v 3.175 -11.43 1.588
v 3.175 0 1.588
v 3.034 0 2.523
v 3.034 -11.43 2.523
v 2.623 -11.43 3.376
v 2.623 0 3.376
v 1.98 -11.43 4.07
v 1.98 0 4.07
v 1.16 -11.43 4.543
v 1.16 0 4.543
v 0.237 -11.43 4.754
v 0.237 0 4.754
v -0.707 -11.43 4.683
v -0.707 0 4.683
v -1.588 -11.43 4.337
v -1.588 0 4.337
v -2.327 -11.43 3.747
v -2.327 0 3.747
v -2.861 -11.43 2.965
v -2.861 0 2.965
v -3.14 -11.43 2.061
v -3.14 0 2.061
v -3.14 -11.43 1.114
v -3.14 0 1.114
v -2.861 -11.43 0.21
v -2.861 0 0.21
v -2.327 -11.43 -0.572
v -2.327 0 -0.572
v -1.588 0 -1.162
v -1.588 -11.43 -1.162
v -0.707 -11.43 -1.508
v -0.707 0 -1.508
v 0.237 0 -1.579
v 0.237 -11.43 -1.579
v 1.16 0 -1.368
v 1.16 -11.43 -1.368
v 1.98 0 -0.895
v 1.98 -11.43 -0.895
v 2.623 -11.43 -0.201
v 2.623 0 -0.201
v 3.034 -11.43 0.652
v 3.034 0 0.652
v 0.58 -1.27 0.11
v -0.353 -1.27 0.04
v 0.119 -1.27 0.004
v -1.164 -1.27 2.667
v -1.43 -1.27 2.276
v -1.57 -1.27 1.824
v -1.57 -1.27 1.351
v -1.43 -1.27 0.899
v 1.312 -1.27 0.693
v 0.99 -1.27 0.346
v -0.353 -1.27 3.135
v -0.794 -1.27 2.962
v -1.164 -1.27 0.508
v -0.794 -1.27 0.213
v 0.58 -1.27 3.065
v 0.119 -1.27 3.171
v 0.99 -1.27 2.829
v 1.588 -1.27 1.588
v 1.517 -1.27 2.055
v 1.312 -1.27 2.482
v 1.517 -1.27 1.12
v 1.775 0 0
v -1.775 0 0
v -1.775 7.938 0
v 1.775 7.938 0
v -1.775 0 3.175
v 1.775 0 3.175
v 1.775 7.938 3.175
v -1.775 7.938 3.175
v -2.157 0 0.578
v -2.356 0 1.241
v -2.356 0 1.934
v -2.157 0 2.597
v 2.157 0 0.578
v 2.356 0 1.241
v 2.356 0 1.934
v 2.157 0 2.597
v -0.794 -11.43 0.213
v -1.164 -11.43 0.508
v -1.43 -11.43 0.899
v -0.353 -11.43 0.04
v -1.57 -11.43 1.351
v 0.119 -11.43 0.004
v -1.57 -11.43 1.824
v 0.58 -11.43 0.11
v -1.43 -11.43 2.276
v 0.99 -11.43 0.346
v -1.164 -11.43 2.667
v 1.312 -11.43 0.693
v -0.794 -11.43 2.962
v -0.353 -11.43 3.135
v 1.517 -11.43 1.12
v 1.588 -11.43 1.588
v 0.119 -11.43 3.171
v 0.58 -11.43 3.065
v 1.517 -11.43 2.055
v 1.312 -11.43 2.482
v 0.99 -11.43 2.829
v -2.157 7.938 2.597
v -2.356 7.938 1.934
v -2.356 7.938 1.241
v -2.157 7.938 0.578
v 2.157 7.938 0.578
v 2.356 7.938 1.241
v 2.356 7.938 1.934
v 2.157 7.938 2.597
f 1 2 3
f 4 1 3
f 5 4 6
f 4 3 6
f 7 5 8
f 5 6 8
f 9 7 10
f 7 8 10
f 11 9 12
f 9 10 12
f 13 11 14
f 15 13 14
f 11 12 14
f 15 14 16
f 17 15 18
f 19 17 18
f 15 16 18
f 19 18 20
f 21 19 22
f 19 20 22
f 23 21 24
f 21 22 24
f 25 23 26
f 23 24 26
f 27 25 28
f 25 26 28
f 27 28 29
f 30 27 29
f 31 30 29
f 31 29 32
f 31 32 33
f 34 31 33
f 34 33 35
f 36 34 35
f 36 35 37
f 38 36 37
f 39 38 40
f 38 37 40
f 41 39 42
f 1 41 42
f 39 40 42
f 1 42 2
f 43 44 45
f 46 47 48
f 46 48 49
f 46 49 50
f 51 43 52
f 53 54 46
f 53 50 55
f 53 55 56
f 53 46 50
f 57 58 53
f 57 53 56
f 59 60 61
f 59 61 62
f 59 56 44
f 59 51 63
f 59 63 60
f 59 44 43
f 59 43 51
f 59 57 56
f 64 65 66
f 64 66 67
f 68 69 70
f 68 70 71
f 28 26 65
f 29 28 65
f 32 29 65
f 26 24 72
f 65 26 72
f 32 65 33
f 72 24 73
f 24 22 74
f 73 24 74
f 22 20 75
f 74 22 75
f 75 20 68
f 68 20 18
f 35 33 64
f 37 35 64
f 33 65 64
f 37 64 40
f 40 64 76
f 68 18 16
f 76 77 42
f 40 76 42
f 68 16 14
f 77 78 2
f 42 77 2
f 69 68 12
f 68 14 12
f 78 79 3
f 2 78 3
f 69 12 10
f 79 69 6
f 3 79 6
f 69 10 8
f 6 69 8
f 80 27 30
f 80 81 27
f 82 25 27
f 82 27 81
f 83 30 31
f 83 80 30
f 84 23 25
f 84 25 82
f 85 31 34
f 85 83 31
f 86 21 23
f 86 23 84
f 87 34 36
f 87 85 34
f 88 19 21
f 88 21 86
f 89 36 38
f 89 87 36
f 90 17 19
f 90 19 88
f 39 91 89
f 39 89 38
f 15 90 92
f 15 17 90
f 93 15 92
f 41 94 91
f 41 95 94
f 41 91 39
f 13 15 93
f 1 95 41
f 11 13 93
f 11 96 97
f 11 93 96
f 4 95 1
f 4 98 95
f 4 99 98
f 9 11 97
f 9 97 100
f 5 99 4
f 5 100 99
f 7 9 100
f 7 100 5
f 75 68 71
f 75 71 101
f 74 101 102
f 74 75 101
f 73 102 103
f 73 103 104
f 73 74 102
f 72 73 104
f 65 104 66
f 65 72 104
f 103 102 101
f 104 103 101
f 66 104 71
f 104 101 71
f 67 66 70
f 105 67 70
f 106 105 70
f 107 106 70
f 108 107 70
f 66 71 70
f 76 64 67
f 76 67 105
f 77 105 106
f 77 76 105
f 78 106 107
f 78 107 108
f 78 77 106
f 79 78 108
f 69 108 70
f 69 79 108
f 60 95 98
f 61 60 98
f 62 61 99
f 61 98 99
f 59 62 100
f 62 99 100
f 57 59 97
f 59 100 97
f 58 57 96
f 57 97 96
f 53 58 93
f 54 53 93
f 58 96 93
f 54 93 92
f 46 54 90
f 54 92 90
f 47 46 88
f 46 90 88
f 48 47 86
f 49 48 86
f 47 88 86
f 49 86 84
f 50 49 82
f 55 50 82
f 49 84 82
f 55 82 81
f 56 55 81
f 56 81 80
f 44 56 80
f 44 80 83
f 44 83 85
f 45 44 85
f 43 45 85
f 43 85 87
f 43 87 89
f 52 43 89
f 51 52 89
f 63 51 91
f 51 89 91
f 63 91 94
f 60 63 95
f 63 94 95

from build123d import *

# Parameters (mm, degrees)
F1_DEPTH = 7.9375
F2_R     = 3.175
F3_DEPTH = 11.43
F4_R     = 1.5875
F5_DEPTH = 10.16


with BuildPart() as f1:
    # F0 (on Front) → F1 (new body)
    with BuildSketch(Plane.XZ):
        with BuildLine():
            Line((-1.7748789571, 0), (1.7748789571, 0))
            ThreePointArc((1.7748789571, 0), (2.38125, 1.5875), (1.7748789571, 3.175))
            Line((1.7748789571, 3.175), (-1.7748789571, 3.175))
            ThreePointArc((-1.7748789571, 3.175), (-2.38125, 1.5875), (-1.7748789571, 0))
        make_face()
    extrude(amount=-F1_DEPTH)

    # F2 (on face) → F3 (join)
    with BuildSketch(Plane.XZ):
        with Locations((0, 1.5875)):
            Circle(F2_R)
        with BuildLine():
            Line((-1.7748789571, 3.175), (1.7748789571, 3.175))
            ThreePointArc((1.7748789571, 3.175), (2.38125, 1.5875), (1.7748789571, 0))
            Line((1.7748789571, 0), (-1.7748789571, 0))
            ThreePointArc((-1.7748789571, 0), (-2.38125, 1.5875), (-1.7748789571, 3.175))
        make_face(mode=Mode.SUBTRACT)
        with BuildLine():
            ThreePointArc((1.7748789571, 0), (2.38125, 1.5875), (1.7748789571, 3.175))
            Line((1.7748789571, 3.175), (-1.7748789571, 3.175))
            ThreePointArc((-1.7748789571, 3.175), (-2.38125, 1.5875), (-1.7748789571, 0))
            Line((-1.7748789571, 0), (1.7748789571, 0))
        make_face()
    extrude(amount=F3_DEPTH)

    # F4 (on face) → F5 (cut)
    with BuildSketch(Plane.XZ.offset(11.43)):
        with Locations((0, 1.5875)):
            Circle(F4_R)
    extrude(amount=-F5_DEPTH, mode=Mode.SUBTRACT)


solid = f1.part
